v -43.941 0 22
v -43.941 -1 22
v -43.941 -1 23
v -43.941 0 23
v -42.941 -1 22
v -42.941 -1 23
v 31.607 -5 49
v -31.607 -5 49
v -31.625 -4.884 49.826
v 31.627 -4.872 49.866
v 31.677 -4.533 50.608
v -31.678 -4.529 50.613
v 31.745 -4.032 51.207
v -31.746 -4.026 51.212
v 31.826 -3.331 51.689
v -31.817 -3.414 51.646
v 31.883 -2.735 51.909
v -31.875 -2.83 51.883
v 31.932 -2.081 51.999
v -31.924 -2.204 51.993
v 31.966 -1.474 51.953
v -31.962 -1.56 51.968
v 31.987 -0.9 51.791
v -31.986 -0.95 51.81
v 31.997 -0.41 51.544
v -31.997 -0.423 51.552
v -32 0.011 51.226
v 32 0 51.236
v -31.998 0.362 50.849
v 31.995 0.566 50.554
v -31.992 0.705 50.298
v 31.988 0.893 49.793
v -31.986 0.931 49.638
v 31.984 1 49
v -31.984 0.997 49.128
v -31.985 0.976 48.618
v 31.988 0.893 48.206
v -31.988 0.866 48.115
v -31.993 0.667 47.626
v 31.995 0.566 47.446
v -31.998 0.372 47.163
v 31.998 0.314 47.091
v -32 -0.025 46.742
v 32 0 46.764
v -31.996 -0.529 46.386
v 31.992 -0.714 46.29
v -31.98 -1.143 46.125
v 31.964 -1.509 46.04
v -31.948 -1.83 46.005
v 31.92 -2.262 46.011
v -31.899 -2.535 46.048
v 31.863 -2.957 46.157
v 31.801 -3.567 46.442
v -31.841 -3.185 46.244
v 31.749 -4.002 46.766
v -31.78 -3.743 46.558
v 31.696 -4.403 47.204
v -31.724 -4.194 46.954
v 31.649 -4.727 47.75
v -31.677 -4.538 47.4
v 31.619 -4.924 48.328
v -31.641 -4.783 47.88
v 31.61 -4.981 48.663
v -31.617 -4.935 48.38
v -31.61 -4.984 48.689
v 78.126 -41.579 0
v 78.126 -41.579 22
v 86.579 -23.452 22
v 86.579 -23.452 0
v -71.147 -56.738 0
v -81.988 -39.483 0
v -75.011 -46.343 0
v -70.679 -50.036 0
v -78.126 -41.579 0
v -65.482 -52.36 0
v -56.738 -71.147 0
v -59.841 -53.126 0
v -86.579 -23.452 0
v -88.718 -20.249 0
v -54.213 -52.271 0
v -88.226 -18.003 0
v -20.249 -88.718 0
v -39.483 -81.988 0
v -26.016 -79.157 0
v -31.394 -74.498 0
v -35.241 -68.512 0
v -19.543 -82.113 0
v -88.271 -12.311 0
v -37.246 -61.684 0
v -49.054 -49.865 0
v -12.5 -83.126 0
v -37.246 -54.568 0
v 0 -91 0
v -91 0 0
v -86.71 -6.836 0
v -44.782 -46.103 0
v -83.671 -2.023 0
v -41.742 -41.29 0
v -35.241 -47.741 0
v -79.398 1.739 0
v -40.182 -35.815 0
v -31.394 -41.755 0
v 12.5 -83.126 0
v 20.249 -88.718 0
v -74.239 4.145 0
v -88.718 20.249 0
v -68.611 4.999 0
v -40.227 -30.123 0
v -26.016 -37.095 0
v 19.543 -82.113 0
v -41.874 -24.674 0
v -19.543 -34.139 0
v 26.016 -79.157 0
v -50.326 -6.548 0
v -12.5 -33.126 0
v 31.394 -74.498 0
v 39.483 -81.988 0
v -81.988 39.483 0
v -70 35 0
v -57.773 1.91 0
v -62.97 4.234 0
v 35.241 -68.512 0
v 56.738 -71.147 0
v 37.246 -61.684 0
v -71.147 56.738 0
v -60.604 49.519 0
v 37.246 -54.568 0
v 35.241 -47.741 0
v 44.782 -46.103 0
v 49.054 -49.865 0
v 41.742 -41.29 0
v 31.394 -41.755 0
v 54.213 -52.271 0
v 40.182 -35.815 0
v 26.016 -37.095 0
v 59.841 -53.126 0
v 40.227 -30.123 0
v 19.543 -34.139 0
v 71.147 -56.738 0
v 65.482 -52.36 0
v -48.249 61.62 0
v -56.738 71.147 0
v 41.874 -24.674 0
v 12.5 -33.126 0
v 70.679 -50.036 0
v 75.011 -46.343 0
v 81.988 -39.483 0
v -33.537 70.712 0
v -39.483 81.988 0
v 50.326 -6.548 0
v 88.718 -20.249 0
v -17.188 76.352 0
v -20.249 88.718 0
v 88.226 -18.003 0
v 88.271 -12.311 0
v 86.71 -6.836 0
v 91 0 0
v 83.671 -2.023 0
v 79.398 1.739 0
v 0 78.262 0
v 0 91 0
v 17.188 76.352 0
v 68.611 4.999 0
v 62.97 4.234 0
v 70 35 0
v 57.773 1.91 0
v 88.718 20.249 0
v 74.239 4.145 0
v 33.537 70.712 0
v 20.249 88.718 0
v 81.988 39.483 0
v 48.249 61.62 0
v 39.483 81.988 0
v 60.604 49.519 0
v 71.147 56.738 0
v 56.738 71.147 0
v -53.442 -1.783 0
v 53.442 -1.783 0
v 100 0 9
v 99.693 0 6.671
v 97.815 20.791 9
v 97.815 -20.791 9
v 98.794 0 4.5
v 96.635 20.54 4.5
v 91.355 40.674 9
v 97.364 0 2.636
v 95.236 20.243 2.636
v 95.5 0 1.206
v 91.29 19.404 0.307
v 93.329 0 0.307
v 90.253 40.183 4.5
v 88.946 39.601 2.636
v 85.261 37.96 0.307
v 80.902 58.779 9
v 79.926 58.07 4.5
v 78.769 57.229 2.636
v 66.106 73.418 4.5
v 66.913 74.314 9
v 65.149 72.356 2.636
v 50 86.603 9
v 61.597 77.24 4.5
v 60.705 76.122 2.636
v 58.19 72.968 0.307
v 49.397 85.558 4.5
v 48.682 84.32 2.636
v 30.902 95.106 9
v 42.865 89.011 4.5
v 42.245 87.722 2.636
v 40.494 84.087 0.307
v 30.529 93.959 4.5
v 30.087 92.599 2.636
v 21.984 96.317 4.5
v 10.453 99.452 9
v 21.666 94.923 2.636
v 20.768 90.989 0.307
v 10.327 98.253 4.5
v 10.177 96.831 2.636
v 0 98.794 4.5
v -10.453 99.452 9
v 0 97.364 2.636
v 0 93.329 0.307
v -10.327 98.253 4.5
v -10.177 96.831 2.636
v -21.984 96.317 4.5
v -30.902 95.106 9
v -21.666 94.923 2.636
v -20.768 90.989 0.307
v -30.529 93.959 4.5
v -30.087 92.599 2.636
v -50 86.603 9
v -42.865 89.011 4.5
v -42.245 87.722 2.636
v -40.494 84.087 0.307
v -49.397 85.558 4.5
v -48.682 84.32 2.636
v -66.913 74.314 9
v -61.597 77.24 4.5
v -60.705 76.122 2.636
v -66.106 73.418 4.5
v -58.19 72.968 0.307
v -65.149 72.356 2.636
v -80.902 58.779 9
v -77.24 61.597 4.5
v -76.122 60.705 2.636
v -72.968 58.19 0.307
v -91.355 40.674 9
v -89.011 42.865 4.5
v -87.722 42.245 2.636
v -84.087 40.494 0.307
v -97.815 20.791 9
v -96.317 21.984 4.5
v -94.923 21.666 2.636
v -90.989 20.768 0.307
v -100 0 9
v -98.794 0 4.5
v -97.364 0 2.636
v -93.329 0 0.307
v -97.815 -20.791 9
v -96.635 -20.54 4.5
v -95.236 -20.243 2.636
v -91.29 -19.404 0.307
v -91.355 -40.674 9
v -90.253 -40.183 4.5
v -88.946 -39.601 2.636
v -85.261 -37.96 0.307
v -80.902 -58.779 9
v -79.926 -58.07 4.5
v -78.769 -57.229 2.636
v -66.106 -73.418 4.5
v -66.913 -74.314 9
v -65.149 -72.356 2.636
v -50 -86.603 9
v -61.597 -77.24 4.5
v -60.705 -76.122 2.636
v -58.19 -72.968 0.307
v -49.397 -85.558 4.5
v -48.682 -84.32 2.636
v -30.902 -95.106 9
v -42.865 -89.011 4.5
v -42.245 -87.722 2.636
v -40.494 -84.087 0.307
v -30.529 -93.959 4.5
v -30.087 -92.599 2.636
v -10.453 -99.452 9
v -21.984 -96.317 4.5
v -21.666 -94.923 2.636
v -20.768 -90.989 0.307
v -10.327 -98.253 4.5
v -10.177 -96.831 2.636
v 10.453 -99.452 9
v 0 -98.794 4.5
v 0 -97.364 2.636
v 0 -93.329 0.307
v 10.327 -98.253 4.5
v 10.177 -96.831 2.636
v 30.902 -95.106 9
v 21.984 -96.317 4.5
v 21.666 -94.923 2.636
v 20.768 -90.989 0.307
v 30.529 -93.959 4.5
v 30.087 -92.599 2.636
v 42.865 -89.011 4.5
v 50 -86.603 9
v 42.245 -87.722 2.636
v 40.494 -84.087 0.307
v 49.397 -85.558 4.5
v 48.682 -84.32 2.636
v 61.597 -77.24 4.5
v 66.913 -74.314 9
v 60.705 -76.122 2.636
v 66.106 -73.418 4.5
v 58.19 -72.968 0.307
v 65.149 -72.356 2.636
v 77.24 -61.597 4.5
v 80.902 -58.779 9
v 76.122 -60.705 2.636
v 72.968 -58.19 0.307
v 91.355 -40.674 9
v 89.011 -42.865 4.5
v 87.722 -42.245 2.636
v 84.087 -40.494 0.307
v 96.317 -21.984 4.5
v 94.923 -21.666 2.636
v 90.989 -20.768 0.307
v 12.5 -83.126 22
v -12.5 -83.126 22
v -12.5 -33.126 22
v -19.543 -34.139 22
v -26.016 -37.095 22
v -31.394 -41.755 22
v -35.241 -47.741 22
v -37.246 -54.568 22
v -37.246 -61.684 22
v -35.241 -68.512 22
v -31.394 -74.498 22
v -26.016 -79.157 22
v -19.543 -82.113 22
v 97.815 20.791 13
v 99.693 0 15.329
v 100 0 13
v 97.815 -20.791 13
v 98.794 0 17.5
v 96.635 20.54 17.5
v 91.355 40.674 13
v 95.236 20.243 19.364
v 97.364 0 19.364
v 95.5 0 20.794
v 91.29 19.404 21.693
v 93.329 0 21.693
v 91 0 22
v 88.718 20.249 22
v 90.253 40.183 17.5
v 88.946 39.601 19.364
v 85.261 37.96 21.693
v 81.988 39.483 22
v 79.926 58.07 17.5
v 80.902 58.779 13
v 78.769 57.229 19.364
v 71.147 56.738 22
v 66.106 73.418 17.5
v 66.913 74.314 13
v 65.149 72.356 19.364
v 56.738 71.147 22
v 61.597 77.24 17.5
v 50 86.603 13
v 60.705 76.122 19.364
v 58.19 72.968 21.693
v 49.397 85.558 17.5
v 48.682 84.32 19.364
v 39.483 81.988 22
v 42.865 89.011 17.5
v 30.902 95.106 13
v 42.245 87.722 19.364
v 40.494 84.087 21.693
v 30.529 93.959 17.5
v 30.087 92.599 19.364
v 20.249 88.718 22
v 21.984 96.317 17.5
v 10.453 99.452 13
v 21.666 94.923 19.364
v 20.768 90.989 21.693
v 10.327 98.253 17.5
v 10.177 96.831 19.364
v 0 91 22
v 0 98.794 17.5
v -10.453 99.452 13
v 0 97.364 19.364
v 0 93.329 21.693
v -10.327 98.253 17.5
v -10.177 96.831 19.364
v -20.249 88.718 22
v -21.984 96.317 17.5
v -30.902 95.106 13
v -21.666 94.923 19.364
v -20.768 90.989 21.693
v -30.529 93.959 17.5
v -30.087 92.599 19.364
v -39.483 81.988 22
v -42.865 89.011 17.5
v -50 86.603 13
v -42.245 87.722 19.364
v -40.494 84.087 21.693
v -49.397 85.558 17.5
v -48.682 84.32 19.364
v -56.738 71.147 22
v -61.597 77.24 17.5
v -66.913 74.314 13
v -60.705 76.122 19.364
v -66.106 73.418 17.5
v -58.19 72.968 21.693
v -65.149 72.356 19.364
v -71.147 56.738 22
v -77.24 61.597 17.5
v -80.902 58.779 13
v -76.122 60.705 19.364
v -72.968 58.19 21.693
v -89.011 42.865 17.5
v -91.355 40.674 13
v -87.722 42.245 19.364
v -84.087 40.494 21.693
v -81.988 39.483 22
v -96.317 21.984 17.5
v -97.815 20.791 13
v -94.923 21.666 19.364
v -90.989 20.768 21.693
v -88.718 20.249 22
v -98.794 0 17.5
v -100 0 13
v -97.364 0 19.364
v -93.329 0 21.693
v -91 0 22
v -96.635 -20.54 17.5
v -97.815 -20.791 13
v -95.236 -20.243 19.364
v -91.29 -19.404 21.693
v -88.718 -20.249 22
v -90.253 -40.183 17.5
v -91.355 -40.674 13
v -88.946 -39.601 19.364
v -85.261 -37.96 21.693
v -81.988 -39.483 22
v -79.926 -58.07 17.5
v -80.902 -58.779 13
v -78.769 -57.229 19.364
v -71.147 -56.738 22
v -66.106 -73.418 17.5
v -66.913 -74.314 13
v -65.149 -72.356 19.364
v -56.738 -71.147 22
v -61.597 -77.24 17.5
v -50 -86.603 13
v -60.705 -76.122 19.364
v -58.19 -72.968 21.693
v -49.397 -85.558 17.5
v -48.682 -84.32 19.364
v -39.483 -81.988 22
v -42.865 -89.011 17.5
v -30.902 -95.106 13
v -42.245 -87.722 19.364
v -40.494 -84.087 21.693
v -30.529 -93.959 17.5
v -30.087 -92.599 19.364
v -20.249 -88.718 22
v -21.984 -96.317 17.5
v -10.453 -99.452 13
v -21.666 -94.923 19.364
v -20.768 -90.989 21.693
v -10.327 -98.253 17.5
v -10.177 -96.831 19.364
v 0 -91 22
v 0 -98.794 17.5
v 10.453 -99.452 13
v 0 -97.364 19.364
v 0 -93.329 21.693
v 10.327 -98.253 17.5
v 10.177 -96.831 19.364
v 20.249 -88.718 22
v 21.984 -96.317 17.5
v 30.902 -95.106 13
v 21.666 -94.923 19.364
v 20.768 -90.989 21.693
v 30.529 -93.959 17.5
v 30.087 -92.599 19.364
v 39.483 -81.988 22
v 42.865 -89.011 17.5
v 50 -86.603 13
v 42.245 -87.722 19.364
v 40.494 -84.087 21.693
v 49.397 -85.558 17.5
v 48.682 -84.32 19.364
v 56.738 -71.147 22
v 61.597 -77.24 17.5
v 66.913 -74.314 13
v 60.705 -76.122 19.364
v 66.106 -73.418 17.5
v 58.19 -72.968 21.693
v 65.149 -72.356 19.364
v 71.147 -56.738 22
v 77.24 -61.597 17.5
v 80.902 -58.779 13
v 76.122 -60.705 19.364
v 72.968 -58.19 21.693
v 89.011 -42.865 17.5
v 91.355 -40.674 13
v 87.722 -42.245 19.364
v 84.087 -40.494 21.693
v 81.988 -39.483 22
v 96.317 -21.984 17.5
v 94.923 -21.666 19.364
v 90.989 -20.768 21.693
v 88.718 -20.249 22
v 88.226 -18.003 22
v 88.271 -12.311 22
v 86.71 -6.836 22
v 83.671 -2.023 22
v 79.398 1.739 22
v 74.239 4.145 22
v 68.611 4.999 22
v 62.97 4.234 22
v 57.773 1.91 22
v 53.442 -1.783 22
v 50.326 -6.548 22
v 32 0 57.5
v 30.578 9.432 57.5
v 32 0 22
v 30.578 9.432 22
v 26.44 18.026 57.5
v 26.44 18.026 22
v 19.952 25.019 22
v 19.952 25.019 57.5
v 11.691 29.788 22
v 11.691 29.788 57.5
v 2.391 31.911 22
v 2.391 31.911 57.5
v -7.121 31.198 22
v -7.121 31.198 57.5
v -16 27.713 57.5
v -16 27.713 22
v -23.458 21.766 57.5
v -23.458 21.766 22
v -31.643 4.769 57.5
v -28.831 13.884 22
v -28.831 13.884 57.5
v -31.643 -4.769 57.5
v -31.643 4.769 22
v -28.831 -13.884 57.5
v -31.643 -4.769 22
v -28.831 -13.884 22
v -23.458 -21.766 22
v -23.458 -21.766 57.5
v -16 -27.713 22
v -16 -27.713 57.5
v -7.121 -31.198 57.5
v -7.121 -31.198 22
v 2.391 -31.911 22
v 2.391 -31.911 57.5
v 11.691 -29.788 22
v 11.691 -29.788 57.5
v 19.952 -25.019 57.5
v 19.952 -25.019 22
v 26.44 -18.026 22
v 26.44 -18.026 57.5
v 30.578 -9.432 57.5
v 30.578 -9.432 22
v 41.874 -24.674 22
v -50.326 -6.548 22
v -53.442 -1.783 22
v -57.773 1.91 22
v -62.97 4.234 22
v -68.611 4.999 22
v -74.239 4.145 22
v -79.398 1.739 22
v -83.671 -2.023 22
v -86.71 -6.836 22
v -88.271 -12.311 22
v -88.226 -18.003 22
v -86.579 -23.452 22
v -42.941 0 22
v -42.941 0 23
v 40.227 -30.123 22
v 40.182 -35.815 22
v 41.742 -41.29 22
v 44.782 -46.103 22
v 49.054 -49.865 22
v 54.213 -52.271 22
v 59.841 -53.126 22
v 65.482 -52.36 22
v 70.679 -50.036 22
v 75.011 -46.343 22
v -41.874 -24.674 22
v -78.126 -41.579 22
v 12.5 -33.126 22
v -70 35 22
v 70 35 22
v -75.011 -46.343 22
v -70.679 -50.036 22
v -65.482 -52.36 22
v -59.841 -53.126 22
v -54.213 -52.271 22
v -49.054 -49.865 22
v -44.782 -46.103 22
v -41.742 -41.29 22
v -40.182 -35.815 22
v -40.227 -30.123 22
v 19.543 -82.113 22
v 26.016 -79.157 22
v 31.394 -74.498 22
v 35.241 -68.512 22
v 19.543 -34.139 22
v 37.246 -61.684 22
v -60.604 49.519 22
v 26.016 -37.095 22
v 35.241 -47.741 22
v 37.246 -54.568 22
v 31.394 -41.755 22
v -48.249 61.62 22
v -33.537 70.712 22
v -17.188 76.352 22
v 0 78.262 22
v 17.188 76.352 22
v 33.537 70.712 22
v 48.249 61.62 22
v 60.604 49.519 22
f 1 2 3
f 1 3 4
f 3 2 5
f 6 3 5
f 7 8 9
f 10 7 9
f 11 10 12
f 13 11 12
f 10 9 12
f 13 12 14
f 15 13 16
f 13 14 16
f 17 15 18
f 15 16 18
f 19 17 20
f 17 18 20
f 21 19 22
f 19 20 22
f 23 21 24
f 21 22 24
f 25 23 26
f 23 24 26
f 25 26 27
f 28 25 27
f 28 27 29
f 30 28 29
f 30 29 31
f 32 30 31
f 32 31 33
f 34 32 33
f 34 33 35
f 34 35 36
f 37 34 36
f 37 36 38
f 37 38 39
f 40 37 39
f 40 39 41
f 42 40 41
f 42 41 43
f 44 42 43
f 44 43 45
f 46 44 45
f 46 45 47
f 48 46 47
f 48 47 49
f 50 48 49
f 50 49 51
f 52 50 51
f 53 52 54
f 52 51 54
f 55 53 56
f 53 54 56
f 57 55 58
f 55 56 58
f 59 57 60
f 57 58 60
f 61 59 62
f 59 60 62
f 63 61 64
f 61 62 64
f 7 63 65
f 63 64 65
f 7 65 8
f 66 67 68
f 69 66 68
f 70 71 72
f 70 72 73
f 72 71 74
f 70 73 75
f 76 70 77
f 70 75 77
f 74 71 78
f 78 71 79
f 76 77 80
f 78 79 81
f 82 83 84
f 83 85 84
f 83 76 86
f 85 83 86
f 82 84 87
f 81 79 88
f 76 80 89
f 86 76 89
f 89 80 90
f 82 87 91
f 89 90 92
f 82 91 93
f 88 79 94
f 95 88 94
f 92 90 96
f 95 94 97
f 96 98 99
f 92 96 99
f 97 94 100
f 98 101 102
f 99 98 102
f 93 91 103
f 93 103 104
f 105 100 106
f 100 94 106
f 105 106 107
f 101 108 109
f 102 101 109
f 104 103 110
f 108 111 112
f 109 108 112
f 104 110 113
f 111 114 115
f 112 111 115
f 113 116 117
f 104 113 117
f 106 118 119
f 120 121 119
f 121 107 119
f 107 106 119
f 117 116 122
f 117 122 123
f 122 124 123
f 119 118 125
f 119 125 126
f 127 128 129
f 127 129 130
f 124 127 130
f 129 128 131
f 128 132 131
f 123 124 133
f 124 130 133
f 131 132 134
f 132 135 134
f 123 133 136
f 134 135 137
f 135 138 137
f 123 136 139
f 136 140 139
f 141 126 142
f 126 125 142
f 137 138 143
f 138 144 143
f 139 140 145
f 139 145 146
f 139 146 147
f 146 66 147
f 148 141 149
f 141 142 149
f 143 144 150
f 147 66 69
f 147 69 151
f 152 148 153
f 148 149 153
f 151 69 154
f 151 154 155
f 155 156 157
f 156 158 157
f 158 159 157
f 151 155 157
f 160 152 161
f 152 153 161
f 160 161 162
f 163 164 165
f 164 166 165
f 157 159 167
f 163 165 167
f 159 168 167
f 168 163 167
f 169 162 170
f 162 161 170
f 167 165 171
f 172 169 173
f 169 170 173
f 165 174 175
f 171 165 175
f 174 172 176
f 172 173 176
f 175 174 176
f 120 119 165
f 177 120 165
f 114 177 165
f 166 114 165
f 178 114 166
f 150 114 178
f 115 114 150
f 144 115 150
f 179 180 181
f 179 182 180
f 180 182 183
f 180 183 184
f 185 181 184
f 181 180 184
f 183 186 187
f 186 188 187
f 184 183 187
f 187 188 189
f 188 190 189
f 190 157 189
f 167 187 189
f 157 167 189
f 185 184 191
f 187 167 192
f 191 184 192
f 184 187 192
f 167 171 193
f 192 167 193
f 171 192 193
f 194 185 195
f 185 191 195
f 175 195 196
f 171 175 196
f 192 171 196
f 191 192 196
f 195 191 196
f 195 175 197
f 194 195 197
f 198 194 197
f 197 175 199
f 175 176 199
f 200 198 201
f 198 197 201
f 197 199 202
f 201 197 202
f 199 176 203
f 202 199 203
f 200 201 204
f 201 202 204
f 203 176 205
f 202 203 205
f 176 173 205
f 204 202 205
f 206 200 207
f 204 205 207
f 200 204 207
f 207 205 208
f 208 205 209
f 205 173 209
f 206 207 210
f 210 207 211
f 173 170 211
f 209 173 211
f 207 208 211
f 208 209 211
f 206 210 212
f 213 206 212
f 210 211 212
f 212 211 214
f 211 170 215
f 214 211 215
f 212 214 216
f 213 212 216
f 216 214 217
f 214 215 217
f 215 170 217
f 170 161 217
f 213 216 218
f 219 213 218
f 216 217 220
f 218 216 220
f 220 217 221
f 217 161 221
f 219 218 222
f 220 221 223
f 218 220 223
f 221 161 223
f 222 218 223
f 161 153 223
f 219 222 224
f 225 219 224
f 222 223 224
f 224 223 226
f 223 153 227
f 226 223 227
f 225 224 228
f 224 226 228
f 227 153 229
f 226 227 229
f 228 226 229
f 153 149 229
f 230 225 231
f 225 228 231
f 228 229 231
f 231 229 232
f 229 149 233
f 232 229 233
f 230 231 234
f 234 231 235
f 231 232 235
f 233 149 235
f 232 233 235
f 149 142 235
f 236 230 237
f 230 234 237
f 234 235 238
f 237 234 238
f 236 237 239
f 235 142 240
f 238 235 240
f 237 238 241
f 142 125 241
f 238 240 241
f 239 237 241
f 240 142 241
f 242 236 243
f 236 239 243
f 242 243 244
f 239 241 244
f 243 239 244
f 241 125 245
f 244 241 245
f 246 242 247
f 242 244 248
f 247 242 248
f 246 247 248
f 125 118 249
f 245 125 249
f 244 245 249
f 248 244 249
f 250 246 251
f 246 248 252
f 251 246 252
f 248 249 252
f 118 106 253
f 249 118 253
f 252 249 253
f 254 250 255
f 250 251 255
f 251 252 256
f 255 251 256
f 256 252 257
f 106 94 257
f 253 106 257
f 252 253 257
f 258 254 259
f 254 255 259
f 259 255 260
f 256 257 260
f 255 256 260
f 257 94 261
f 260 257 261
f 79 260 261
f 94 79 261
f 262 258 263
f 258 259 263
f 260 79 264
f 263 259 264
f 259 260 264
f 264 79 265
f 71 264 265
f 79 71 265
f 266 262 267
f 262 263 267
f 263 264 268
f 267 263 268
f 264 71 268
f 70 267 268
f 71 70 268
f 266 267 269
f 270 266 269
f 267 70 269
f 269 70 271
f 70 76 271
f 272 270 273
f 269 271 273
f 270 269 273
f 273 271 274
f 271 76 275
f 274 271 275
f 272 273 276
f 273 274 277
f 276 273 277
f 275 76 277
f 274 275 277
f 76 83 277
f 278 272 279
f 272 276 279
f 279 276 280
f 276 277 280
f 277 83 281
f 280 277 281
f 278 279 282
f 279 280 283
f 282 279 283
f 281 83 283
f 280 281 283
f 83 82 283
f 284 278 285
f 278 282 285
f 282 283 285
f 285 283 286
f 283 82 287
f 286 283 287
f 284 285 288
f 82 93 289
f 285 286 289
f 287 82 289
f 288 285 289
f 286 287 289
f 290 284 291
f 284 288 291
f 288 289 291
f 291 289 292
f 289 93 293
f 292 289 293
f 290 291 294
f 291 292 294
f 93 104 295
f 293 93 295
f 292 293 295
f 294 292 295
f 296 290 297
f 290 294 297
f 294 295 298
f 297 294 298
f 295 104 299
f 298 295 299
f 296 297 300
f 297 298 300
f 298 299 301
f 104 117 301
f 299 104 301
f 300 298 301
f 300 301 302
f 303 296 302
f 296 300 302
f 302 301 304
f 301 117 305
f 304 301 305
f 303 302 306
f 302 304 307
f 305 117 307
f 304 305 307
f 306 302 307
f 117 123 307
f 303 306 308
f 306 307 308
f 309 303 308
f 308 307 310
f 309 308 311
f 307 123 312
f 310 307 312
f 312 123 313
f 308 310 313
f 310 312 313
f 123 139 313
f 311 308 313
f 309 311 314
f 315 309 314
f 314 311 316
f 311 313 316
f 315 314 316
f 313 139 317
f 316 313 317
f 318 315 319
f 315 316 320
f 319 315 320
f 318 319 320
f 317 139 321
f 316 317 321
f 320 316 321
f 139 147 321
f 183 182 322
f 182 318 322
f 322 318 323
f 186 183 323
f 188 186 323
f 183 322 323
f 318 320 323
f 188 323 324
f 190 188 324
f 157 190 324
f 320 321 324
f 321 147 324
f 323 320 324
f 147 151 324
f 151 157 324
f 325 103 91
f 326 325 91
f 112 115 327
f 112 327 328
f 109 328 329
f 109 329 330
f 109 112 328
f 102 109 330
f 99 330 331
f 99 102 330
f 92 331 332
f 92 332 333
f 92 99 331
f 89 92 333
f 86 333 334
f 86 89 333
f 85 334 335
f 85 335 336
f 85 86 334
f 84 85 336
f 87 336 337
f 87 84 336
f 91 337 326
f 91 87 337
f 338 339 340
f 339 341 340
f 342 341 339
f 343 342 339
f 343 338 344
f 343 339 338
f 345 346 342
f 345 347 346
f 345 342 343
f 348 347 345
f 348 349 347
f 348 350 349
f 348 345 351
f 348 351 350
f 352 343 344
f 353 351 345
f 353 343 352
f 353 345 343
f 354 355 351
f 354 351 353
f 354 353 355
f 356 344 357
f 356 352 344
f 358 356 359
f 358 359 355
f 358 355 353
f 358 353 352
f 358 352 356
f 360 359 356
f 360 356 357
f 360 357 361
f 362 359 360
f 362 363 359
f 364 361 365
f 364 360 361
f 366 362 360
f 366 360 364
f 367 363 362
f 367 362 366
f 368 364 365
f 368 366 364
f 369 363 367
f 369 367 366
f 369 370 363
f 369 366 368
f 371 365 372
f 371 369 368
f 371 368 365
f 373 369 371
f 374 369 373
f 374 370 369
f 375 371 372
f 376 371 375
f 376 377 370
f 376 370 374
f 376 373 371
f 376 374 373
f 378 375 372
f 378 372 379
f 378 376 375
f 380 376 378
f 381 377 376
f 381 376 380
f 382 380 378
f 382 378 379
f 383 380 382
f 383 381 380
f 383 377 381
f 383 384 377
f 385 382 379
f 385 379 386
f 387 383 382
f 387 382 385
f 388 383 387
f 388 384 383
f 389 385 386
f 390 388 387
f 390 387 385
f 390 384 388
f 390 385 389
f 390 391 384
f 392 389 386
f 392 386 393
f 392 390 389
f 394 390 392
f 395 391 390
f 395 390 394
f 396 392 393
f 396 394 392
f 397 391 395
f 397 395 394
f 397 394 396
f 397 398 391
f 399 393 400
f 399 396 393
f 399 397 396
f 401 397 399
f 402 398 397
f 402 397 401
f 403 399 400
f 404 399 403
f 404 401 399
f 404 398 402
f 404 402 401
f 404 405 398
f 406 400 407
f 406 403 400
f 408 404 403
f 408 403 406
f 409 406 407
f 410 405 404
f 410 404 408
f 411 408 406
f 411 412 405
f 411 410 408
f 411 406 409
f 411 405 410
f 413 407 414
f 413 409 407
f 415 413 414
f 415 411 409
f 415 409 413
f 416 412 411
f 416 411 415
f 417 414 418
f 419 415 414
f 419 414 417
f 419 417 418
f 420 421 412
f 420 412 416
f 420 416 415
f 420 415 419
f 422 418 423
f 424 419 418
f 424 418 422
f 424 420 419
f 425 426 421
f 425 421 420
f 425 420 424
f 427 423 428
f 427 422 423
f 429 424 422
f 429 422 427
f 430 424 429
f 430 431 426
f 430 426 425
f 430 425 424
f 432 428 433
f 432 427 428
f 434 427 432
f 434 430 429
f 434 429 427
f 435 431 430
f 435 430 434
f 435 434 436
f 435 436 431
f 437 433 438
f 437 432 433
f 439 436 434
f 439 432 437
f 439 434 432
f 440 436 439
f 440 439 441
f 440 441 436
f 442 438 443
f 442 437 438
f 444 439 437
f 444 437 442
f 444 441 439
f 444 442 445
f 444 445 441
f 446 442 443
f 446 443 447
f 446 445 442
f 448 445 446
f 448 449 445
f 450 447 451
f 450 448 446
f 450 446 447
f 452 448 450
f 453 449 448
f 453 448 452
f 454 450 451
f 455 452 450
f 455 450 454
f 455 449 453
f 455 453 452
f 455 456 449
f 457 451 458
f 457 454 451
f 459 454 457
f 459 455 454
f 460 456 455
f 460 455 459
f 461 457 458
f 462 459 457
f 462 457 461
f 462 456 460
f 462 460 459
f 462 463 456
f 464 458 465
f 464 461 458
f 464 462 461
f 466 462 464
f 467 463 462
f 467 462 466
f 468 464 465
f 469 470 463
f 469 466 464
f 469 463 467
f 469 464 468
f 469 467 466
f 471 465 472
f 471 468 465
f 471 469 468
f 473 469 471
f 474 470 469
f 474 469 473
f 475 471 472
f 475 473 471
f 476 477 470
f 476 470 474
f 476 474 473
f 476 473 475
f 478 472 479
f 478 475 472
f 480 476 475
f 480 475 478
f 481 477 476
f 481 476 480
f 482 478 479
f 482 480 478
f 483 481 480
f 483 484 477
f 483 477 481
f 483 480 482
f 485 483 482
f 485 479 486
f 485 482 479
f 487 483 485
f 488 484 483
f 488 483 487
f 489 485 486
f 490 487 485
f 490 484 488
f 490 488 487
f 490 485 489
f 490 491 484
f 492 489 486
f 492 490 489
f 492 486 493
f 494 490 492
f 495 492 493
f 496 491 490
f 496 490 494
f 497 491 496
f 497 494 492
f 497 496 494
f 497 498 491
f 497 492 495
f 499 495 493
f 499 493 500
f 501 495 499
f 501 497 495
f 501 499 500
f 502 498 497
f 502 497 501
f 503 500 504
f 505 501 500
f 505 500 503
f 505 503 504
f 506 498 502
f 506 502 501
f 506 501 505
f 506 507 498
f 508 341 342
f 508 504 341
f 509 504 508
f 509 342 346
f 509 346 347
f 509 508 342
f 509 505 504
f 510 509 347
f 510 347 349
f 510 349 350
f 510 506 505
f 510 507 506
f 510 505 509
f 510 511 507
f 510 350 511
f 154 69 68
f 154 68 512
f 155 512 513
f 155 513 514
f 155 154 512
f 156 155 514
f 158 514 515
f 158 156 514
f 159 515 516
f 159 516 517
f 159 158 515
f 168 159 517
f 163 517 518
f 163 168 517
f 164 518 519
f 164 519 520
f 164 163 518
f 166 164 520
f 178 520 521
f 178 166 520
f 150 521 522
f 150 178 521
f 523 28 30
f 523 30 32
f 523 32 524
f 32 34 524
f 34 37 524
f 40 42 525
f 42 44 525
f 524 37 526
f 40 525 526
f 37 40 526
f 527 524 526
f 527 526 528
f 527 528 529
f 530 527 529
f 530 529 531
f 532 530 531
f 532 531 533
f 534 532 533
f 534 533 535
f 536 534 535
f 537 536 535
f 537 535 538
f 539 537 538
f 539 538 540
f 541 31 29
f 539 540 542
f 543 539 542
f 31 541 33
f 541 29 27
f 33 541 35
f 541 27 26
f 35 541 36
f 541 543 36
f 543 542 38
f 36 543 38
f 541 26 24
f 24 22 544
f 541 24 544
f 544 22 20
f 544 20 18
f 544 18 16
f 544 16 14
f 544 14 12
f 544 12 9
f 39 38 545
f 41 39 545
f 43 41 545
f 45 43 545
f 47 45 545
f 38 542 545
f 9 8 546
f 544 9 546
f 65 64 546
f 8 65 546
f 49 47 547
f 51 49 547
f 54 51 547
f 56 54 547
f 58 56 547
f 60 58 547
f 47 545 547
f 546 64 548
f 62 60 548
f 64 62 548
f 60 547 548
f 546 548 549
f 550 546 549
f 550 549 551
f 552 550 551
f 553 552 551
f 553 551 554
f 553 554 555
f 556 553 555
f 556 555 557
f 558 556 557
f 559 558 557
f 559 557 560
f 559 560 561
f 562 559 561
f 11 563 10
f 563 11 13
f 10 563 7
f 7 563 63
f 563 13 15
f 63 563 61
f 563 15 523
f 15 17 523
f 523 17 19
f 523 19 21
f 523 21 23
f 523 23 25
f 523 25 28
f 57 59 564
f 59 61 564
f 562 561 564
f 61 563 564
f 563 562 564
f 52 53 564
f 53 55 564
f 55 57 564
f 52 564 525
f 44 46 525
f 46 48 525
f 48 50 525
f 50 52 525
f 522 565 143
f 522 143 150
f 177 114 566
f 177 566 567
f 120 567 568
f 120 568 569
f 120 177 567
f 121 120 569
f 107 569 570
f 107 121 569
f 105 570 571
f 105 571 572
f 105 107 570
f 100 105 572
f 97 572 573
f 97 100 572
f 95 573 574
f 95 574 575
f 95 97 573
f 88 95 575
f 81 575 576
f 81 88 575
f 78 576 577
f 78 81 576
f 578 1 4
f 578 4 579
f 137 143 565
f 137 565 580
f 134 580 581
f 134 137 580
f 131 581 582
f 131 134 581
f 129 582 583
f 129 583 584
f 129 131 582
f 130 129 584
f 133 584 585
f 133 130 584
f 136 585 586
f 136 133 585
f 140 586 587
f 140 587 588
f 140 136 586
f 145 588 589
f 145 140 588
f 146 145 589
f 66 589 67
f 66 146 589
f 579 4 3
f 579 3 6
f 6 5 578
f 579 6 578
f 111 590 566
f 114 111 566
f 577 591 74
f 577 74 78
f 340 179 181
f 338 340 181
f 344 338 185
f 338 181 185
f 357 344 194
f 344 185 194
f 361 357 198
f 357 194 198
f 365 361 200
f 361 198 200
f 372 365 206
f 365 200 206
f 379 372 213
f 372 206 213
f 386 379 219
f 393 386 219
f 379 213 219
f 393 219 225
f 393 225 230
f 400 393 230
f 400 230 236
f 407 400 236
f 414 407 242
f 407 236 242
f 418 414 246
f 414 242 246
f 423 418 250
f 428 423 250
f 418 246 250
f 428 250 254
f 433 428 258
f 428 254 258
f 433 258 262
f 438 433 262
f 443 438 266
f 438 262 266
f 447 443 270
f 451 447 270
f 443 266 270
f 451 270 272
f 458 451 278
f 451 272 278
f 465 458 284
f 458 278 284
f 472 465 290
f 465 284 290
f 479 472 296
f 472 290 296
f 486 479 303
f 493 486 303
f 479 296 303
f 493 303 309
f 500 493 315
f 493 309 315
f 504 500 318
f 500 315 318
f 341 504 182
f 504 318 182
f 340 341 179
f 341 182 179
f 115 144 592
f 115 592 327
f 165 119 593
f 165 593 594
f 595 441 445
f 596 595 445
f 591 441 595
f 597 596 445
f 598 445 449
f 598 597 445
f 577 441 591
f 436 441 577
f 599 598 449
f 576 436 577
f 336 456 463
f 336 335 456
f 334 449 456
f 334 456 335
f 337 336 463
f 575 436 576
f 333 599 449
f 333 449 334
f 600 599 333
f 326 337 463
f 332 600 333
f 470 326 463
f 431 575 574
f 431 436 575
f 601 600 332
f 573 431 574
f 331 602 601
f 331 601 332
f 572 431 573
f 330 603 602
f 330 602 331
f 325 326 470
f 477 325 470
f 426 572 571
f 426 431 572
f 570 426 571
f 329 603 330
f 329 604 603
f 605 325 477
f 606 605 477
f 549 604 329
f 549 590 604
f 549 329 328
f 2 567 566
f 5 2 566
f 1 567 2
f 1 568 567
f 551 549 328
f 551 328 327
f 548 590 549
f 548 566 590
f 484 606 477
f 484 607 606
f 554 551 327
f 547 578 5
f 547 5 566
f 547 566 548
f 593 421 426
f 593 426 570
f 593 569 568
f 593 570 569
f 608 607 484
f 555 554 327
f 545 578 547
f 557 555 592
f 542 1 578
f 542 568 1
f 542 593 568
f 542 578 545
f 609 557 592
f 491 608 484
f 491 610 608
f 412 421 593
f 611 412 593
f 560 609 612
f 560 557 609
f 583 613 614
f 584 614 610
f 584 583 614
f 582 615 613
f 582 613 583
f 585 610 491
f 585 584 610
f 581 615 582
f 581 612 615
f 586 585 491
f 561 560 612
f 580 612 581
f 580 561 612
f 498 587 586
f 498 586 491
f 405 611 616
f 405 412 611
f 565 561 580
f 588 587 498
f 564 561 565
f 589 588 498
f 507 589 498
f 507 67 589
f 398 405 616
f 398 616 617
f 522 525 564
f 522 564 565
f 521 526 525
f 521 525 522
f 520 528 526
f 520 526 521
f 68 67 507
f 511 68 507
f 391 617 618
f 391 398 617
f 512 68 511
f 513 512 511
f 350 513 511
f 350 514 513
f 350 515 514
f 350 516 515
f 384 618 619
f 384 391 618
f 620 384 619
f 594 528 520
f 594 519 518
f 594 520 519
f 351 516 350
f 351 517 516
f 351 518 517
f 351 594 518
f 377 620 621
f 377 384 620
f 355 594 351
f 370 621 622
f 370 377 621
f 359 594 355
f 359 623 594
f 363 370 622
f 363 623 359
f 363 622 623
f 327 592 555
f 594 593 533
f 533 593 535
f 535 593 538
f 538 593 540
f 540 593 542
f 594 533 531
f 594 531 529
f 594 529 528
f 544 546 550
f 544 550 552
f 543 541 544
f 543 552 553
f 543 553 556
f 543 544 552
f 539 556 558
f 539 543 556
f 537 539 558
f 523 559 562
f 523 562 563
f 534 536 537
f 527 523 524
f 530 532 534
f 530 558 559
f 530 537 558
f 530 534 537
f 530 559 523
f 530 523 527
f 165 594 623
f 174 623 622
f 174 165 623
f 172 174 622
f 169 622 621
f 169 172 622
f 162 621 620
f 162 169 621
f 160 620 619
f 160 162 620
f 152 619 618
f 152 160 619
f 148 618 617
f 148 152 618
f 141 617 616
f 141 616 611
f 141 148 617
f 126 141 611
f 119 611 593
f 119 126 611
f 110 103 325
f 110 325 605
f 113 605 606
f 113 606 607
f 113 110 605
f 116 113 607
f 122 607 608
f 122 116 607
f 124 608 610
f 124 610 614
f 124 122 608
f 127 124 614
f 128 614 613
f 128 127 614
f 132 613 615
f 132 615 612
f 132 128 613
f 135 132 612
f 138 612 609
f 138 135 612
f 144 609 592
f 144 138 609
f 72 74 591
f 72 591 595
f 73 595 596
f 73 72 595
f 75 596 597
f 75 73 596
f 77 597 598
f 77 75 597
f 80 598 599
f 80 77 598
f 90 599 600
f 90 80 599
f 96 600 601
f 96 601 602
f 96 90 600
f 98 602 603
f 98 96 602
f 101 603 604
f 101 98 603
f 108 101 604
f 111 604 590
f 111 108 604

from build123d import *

# Parameters (mm, degrees)
SKETCH_R     = 100
PAD_DEPTH    = 22
SKETCH001_R  = 32
PAD001_DEPTH = 35.5
SKETCH002_W  = 1
SKETCH002_H  = 1
PAD002_DEPTH = 1
SKETCH003_R  = 3
POCKET_DEPTH = 143.942083
FILLET_R     = 9


with BuildPart() as part:
    # Sketch → Pad (new body)
    with BuildSketch(Plane.XY):
        Circle(SKETCH_R)
        with BuildLine():
            Line((-70, 35), (70, 35))
            ThreePointArc((70, 35), (0, 78.262379), (-70, 35))
        make_face(mode=Mode.SUBTRACT)
        with BuildLine():
            ThreePointArc((-78.126156, -41.578521), (-51.547635, -51.252311), (-41.873844, -24.673791))
            Line((-41.873844, -24.673791), (-50.326209, -6.547635))
            ThreePointArc((-50.326209, -6.547635), (-76.90473, 3.126156), (-86.578521, -23.452365))
            Line((-78.126156, -41.578521), (-86.578521, -23.452365))
        make_face(mode=Mode.SUBTRACT)
        with BuildLine():
            ThreePointArc((41.873844, -24.673791), (51.547635, -51.252311), (78.126156, -41.578521))
            Line((78.126156, -41.578521), (86.578521, -23.452365))
            ThreePointArc((86.578521, -23.452365), (76.90473, 3.126156), (50.326209, -6.547635))
            Line((41.873844, -24.673791), (50.326209, -6.547635))
        make_face(mode=Mode.SUBTRACT)
        with BuildLine():
            Line((12.5, -33.126156), (-12.5, -33.126156))
            ThreePointArc((-12.5, -33.126156), (-37.5, -58.126156), (-12.5, -83.126156))
            Line((12.5, -83.126156), (-12.5, -83.126156))
            ThreePointArc((12.5, -83.126156), (37.5, -58.126156), (12.5, -33.126156))
        make_face(mode=Mode.SUBTRACT)
    extrude(amount=PAD_DEPTH)

    # Sketch001 → Pad001 (new body)
    with BuildSketch(Plane.XY.offset(22)):
        Circle(SKETCH001_R)
    extrude(amount=PAD001_DEPTH)

    # Sketch002 → Pad002 (new body)
    with BuildSketch(Plane.XY.offset(22)):
        with Locations((-43.441083, -0.5)):
            Rectangle(SKETCH002_W, SKETCH002_H)
    extrude(amount=PAD002_DEPTH)

    # Sketch003 → Pocket (cut, through all)
    with BuildSketch(Plane(origin=(-43.941083, 0, 0), x_dir=(0, -1, 0), z_dir=(-1, 0, 0))):
        with Locations((2, 49)):
            Circle(SKETCH003_R)
    extrude(amount=-POCKET_DEPTH, mode=Mode.SUBTRACT)

    # Fillet
    fillet_edges = [part.edges().sort_by_distance(p)[0] for p in [
        (-100, 0, 22),
        (-100, 0, 0),
    ]]
    fillet(fillet_edges, radius=FILLET_R)


solid = part.part
